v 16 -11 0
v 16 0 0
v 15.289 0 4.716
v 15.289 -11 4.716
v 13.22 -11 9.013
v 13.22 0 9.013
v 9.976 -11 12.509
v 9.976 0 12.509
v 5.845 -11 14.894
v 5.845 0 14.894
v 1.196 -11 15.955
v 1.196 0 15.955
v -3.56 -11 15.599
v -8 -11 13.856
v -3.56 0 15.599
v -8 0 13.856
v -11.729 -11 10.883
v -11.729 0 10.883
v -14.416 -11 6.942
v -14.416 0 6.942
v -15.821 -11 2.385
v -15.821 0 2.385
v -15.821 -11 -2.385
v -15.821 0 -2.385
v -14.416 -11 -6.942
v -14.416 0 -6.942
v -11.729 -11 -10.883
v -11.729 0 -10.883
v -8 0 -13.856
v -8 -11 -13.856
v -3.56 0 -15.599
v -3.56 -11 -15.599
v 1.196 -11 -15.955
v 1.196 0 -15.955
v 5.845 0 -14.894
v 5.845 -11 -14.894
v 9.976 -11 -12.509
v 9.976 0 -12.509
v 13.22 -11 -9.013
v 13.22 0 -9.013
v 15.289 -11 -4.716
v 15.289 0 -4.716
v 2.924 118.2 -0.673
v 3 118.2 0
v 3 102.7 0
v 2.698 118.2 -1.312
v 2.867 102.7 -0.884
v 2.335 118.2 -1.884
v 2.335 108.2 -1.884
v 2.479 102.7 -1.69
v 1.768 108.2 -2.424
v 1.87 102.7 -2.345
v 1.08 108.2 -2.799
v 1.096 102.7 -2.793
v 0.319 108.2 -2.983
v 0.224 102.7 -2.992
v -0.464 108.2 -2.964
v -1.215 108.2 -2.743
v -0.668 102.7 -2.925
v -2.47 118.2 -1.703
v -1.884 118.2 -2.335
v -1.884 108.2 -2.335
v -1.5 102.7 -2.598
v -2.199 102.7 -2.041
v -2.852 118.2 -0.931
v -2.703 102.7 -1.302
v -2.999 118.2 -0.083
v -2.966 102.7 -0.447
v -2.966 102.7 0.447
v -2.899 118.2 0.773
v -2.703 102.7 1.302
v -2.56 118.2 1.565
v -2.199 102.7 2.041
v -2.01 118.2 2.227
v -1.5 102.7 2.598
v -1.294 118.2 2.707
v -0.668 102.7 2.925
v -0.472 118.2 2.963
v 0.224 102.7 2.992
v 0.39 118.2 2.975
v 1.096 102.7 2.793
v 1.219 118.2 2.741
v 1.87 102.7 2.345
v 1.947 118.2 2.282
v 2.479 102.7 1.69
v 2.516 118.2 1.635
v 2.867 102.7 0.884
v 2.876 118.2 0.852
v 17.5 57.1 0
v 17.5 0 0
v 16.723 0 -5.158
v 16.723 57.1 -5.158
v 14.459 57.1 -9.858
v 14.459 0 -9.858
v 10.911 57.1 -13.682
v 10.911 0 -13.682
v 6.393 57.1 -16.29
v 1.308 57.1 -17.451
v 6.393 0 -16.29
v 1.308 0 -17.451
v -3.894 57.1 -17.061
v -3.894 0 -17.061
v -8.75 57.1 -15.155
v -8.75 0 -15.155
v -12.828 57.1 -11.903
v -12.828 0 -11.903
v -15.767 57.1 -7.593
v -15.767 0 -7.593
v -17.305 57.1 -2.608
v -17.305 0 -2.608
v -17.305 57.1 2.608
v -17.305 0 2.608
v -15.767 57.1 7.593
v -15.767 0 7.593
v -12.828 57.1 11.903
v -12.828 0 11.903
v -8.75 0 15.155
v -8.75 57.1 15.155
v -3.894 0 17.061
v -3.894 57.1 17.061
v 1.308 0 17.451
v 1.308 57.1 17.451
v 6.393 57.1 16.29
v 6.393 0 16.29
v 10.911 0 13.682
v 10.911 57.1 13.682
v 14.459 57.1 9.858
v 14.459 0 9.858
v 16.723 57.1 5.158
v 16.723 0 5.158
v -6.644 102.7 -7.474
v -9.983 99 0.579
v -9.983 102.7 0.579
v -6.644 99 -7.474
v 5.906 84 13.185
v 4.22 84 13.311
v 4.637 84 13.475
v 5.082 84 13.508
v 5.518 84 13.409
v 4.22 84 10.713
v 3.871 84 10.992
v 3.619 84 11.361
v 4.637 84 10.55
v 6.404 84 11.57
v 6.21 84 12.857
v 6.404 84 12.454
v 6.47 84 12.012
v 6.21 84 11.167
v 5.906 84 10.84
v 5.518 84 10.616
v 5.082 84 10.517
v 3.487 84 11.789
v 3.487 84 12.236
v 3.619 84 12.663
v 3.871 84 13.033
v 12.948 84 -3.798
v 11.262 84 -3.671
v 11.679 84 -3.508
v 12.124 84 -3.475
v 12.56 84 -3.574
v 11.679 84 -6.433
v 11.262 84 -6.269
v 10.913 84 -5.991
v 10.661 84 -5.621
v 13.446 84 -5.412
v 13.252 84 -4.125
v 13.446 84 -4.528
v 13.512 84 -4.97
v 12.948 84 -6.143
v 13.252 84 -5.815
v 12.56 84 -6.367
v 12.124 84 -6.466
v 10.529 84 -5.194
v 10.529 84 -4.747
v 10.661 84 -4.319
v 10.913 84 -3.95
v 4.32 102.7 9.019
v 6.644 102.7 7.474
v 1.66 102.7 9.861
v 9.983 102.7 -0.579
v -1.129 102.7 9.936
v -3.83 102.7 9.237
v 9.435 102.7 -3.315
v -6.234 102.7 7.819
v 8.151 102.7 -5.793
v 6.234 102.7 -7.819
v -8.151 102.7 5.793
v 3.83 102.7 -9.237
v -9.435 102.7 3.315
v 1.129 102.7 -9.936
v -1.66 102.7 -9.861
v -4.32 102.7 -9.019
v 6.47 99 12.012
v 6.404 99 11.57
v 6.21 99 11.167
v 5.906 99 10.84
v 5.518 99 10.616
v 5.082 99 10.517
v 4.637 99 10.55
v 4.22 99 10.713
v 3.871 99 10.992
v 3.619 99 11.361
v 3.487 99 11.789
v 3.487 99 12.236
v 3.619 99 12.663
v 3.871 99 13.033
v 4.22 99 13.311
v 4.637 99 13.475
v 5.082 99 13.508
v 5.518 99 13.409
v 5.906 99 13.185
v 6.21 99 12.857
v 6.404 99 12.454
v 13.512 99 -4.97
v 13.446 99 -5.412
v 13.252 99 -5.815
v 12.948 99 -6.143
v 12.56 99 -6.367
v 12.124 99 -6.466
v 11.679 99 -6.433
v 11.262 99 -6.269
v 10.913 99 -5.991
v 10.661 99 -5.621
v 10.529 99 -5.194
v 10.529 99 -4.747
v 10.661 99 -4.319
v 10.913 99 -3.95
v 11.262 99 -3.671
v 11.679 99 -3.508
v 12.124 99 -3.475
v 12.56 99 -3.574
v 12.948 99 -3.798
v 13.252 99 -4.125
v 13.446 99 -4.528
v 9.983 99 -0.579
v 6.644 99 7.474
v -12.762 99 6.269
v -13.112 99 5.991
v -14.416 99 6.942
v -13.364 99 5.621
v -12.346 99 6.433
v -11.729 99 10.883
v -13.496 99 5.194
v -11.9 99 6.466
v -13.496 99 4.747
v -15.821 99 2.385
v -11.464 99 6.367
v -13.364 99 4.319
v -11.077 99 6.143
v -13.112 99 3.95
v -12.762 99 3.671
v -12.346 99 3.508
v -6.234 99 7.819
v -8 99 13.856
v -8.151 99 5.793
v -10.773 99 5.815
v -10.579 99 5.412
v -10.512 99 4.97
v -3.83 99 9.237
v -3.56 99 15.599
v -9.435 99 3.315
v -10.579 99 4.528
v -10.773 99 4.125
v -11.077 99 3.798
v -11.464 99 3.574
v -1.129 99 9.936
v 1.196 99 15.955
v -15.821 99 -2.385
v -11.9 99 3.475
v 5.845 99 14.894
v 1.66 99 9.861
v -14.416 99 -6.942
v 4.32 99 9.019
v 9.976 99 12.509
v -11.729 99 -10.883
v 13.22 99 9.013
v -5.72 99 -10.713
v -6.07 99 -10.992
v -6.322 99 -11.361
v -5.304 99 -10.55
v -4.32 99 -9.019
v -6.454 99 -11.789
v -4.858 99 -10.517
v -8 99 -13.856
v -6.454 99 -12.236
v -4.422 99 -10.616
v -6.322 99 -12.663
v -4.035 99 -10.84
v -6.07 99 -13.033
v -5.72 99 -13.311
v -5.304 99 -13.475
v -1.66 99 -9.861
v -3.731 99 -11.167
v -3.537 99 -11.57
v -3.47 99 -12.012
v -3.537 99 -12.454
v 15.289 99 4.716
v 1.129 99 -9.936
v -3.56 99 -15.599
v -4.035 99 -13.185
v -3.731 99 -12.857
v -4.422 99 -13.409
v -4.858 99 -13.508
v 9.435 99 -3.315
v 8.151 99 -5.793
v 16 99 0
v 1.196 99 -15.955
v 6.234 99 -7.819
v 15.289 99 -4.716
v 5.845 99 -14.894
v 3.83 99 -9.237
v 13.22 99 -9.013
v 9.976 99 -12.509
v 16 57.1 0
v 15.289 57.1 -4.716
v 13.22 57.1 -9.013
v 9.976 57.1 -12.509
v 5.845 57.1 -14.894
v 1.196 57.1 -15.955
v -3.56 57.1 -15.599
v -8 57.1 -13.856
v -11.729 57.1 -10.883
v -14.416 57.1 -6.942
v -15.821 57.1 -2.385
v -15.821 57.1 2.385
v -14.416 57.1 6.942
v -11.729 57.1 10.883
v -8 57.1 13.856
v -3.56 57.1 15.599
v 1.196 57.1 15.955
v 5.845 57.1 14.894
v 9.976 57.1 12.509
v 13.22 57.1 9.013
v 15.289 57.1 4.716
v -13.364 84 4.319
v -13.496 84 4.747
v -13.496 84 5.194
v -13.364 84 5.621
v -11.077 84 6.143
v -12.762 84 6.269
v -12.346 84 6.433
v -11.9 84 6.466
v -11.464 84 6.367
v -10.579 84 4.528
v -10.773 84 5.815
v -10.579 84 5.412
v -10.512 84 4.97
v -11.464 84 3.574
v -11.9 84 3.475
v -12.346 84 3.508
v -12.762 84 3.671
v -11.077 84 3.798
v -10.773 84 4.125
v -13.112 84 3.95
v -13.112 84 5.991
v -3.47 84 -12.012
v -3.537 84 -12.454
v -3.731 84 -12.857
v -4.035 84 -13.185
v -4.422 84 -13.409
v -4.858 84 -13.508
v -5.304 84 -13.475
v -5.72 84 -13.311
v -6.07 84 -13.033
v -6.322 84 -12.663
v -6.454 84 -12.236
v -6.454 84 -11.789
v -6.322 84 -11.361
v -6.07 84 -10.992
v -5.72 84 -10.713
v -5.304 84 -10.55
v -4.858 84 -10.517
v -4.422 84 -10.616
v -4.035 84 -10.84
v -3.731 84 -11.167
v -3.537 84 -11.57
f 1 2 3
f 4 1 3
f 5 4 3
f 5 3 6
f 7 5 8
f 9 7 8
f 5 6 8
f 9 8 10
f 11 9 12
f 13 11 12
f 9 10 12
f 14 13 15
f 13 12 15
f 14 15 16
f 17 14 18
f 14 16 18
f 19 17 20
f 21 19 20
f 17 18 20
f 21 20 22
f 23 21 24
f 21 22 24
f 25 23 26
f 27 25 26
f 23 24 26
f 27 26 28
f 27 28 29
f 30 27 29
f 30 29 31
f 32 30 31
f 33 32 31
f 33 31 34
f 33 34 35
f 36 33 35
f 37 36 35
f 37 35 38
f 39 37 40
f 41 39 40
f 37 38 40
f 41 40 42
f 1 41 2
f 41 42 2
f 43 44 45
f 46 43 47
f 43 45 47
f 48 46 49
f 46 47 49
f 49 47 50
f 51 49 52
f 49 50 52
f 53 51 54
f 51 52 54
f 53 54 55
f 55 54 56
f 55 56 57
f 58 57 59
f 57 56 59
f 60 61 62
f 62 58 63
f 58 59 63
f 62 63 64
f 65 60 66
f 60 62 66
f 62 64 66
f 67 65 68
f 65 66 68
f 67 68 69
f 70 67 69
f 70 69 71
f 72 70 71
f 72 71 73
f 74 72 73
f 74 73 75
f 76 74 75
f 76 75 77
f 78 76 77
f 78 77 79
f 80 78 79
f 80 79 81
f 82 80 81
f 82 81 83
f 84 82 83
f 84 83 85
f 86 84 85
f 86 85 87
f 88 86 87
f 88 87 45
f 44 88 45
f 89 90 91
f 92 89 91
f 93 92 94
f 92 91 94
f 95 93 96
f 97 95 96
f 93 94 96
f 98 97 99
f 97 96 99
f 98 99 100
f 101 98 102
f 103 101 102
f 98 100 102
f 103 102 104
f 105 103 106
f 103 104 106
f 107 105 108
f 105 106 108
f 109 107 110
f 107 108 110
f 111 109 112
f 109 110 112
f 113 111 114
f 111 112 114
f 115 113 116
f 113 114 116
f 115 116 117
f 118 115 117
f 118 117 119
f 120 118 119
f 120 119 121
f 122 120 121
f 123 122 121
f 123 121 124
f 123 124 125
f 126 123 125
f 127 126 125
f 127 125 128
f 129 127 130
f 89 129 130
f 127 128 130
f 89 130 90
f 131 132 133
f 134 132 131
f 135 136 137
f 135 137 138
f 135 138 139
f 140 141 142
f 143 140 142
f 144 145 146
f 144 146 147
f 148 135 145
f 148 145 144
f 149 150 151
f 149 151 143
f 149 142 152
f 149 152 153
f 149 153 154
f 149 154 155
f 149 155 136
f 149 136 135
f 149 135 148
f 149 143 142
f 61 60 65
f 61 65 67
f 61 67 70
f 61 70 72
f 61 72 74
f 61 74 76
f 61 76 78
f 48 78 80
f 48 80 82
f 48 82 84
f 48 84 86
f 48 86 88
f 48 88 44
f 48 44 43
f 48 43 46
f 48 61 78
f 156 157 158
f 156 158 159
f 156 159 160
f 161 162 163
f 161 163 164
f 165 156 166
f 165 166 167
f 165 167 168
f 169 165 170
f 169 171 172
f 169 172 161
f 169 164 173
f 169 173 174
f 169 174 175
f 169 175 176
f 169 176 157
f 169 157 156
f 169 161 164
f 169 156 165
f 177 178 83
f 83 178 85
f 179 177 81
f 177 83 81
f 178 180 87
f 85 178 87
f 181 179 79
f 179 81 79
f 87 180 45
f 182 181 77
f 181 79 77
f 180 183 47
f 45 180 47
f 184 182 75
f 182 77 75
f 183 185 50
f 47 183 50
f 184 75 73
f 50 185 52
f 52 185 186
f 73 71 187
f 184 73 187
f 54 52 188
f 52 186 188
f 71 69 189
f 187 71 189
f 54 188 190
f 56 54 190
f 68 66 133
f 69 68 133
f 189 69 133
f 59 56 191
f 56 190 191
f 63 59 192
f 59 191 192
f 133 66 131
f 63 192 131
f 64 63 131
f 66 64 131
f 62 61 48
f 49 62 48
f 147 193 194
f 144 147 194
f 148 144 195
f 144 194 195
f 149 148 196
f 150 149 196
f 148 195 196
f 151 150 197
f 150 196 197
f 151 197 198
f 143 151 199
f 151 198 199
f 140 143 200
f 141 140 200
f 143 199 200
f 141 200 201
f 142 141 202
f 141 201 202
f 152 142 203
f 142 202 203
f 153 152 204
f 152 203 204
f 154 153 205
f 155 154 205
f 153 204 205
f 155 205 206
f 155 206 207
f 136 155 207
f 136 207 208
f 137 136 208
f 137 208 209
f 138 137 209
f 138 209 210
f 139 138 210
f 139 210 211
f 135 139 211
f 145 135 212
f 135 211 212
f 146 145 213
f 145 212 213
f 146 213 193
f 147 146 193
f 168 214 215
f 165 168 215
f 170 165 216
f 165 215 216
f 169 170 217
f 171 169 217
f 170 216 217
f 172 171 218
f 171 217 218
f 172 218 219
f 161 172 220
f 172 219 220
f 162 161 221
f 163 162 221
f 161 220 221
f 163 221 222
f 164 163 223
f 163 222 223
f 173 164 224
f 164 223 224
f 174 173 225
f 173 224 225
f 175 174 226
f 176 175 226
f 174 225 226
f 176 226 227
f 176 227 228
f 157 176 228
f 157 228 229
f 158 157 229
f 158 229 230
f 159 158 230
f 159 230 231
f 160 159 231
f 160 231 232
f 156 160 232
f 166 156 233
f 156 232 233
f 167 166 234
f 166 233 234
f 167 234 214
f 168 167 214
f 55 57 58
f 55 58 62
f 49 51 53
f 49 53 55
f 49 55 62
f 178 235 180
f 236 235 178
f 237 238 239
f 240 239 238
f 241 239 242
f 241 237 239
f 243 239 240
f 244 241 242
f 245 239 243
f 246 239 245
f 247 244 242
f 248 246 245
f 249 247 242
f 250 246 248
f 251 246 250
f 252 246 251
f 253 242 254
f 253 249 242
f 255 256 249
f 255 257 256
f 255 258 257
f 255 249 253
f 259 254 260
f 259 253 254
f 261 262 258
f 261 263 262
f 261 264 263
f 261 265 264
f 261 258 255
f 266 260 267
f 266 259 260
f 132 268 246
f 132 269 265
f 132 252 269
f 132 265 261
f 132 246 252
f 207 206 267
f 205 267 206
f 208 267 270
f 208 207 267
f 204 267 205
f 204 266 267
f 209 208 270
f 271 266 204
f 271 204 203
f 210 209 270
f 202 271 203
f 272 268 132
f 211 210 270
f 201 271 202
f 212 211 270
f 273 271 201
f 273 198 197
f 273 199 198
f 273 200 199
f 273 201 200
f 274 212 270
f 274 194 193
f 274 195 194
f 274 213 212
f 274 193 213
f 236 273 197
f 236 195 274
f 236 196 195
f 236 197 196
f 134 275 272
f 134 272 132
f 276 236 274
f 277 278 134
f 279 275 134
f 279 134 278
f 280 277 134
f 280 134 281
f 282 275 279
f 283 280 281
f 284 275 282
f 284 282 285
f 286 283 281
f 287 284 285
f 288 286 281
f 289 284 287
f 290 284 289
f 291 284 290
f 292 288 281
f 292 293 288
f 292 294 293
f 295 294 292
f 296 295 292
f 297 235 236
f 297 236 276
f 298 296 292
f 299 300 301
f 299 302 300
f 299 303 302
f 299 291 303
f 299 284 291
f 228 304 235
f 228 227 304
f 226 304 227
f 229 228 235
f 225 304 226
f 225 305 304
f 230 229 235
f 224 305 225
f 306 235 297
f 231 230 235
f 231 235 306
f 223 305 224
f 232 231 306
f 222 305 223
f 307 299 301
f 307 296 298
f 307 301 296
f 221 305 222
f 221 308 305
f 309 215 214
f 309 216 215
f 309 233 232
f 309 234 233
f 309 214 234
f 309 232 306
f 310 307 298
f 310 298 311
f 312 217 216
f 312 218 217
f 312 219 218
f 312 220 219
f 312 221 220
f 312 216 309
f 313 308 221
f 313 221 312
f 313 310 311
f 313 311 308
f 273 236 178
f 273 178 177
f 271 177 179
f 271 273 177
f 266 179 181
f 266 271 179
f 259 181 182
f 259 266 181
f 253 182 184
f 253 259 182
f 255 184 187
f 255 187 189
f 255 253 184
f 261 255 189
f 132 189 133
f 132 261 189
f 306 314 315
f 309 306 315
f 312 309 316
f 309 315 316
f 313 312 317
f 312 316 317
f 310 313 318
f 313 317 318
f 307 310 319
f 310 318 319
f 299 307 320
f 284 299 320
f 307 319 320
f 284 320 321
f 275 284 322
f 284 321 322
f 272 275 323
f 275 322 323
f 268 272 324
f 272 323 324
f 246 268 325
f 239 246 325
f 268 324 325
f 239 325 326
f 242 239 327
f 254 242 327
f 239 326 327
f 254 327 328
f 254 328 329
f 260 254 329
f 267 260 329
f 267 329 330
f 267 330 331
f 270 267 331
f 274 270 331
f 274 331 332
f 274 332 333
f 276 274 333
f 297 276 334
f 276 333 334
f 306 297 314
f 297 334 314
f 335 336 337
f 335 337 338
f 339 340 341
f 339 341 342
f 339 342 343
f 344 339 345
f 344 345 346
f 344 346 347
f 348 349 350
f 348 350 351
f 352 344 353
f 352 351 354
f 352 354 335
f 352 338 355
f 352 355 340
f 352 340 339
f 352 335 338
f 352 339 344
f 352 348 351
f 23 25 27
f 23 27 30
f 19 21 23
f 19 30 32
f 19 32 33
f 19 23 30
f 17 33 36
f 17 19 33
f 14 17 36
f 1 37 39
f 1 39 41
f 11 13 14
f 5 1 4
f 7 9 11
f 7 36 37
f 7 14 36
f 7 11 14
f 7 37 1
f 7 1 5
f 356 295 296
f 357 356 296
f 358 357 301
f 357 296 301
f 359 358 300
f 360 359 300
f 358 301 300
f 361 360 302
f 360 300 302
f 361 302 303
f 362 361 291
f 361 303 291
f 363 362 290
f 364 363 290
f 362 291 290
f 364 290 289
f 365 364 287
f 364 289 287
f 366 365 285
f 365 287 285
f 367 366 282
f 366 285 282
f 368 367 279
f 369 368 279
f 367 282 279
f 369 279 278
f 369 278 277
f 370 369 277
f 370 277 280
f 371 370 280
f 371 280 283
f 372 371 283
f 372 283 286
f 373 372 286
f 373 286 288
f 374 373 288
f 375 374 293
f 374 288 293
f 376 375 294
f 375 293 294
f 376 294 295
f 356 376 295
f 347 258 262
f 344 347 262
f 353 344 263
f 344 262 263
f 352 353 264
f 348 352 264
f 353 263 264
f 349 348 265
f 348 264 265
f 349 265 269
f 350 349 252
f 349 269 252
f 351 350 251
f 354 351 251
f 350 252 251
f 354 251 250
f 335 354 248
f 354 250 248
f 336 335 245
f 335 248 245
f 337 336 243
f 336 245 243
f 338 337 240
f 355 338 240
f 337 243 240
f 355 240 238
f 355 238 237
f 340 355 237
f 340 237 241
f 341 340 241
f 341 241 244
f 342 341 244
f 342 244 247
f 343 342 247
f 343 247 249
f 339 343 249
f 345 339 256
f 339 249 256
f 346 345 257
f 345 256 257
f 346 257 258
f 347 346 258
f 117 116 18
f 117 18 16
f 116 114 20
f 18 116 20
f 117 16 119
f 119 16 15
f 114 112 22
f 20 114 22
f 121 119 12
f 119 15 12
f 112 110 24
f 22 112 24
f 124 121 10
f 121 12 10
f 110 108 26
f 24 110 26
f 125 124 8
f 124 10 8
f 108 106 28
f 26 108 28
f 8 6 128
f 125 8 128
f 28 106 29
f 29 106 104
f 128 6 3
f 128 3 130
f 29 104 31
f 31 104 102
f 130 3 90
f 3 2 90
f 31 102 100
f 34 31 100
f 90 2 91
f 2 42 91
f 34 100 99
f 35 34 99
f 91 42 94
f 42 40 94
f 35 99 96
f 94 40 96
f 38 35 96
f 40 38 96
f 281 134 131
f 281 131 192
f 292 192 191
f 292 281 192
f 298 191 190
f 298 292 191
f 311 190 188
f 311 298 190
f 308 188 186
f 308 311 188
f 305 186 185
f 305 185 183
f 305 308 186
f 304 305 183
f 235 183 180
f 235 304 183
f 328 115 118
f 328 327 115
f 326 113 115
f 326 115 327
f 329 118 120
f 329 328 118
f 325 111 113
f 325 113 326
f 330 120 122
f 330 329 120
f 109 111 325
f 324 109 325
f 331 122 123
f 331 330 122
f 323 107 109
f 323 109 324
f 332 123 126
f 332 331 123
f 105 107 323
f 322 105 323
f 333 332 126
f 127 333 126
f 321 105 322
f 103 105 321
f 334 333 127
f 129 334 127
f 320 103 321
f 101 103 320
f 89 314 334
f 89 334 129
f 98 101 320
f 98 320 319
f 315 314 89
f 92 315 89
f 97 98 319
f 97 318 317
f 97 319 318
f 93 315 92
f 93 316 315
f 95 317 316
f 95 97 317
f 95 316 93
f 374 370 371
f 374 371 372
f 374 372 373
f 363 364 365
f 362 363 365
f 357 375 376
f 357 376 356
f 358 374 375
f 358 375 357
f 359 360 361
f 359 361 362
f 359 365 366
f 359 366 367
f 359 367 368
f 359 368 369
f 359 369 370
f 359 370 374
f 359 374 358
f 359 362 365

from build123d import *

# Parameters (mm, degrees)
SKETCH1_R           = 17.5
BOSS_EXTRUDE1_DEPTH = 57.1
SKETCH2_R           = 16
BOSS_EXTRUDE2_DEPTH = 11
SKETCH3_R           = 16
BOSS_EXTRUDE3_DEPTH = 41.9
SKETCH4_R           = 1.5
CUT_EXTRUDE2_DEPTH  = 15
BOSS_EXTRUDE5_DEPTH = 3.7
SKETCH7_R           = 3
BOSS_EXTRUDE6_DEPTH = 15.5
CUT_EXTRUDE3_DEPTH  = 10


with BuildPart() as part:
    # Sketch1 → Boss-Extrude1 (new body)
    with BuildSketch(Plane(origin=(0, 0, 0), x_dir=(1, 0, 0), z_dir=(0, 1, 0))):
        Circle(SKETCH1_R)
    extrude(amount=BOSS_EXTRUDE1_DEPTH)

    # Sketch2 → Boss-Extrude2 (add)
    with BuildSketch(Plane.XZ):
        Circle(SKETCH2_R)
    extrude(amount=BOSS_EXTRUDE2_DEPTH)

    # Sketch3 → Boss-Extrude3 (add)
    with BuildSketch(Plane(origin=(0, 57.1, 0), x_dir=(1, 0, 0), z_dir=(0, 1, 0))):
        Circle(SKETCH3_R)
    extrude(amount=BOSS_EXTRUDE3_DEPTH)

    # Sketch4 → Cut-Extrude2 (cut)
    with BuildSketch(Plane(origin=(0, 99, 0), x_dir=(1, 0, 0), z_dir=(0, 1, 0))):
        with Locations((12.012324504, 4.970317898)):
            Circle(SKETCH4_R)
        with Locations((-4.970317898, 12.012324504)):
            Circle(SKETCH4_R)
        with Locations((-12.012324504, -4.970317898)):
            Circle(SKETCH4_R)
        with Locations((4.970317898, -12.012324504)):
            Circle(SKETCH4_R)
    extrude(amount=-CUT_EXTRUDE2_DEPTH, mode=Mode.SUBTRACT)

    # Sketch6 → Boss-Extrude5 (add)
    with BuildSketch(Plane(origin=(0, 99, 0), x_dir=(1, 0, 0), z_dir=(0, 1, 0))):
        with BuildLine():
            Line((-9.983215116, -0.579151054), (-6.643996337, 7.473774995))
            ThreePointArc((-6.643996337, 7.473774995), (3.830346634, 9.237339696), (9.983215116, 0.579151054))
            Line((9.983215116, 0.579151054), (6.643996337, -7.473774995))
            ThreePointArc((6.643996337, -7.473774995), (-3.830346634, -9.237339696), (-9.983215116, -0.579151054))
        make_face()
    extrude(amount=BOSS_EXTRUDE5_DEPTH)

    # Sketch7 → Boss-Extrude6 (add)
    with BuildSketch(Plane(origin=(0, 102.7, 0), x_dir=(1, 0, 0), z_dir=(0, 1, 0))):
        Circle(SKETCH7_R)
    extrude(amount=BOSS_EXTRUDE6_DEPTH)

    # Sketch8 → Cut-Extrude3 (cut)
    with BuildSketch(Plane(origin=(0, 118.2, 0), x_dir=(1, 0, 0), z_dir=(0, 1, 0))):
        with BuildLine():
            Line((-1.883851207, 2.334760079), (2.334760079, 1.883851207))
            ThreePointArc((2.334760079, 1.883851207), (0.318840721, 2.983008648), (-1.883851207, 2.334760079))
        make_face()
    extrude(amount=-CUT_EXTRUDE3_DEPTH, mode=Mode.SUBTRACT)


solid = part.part
